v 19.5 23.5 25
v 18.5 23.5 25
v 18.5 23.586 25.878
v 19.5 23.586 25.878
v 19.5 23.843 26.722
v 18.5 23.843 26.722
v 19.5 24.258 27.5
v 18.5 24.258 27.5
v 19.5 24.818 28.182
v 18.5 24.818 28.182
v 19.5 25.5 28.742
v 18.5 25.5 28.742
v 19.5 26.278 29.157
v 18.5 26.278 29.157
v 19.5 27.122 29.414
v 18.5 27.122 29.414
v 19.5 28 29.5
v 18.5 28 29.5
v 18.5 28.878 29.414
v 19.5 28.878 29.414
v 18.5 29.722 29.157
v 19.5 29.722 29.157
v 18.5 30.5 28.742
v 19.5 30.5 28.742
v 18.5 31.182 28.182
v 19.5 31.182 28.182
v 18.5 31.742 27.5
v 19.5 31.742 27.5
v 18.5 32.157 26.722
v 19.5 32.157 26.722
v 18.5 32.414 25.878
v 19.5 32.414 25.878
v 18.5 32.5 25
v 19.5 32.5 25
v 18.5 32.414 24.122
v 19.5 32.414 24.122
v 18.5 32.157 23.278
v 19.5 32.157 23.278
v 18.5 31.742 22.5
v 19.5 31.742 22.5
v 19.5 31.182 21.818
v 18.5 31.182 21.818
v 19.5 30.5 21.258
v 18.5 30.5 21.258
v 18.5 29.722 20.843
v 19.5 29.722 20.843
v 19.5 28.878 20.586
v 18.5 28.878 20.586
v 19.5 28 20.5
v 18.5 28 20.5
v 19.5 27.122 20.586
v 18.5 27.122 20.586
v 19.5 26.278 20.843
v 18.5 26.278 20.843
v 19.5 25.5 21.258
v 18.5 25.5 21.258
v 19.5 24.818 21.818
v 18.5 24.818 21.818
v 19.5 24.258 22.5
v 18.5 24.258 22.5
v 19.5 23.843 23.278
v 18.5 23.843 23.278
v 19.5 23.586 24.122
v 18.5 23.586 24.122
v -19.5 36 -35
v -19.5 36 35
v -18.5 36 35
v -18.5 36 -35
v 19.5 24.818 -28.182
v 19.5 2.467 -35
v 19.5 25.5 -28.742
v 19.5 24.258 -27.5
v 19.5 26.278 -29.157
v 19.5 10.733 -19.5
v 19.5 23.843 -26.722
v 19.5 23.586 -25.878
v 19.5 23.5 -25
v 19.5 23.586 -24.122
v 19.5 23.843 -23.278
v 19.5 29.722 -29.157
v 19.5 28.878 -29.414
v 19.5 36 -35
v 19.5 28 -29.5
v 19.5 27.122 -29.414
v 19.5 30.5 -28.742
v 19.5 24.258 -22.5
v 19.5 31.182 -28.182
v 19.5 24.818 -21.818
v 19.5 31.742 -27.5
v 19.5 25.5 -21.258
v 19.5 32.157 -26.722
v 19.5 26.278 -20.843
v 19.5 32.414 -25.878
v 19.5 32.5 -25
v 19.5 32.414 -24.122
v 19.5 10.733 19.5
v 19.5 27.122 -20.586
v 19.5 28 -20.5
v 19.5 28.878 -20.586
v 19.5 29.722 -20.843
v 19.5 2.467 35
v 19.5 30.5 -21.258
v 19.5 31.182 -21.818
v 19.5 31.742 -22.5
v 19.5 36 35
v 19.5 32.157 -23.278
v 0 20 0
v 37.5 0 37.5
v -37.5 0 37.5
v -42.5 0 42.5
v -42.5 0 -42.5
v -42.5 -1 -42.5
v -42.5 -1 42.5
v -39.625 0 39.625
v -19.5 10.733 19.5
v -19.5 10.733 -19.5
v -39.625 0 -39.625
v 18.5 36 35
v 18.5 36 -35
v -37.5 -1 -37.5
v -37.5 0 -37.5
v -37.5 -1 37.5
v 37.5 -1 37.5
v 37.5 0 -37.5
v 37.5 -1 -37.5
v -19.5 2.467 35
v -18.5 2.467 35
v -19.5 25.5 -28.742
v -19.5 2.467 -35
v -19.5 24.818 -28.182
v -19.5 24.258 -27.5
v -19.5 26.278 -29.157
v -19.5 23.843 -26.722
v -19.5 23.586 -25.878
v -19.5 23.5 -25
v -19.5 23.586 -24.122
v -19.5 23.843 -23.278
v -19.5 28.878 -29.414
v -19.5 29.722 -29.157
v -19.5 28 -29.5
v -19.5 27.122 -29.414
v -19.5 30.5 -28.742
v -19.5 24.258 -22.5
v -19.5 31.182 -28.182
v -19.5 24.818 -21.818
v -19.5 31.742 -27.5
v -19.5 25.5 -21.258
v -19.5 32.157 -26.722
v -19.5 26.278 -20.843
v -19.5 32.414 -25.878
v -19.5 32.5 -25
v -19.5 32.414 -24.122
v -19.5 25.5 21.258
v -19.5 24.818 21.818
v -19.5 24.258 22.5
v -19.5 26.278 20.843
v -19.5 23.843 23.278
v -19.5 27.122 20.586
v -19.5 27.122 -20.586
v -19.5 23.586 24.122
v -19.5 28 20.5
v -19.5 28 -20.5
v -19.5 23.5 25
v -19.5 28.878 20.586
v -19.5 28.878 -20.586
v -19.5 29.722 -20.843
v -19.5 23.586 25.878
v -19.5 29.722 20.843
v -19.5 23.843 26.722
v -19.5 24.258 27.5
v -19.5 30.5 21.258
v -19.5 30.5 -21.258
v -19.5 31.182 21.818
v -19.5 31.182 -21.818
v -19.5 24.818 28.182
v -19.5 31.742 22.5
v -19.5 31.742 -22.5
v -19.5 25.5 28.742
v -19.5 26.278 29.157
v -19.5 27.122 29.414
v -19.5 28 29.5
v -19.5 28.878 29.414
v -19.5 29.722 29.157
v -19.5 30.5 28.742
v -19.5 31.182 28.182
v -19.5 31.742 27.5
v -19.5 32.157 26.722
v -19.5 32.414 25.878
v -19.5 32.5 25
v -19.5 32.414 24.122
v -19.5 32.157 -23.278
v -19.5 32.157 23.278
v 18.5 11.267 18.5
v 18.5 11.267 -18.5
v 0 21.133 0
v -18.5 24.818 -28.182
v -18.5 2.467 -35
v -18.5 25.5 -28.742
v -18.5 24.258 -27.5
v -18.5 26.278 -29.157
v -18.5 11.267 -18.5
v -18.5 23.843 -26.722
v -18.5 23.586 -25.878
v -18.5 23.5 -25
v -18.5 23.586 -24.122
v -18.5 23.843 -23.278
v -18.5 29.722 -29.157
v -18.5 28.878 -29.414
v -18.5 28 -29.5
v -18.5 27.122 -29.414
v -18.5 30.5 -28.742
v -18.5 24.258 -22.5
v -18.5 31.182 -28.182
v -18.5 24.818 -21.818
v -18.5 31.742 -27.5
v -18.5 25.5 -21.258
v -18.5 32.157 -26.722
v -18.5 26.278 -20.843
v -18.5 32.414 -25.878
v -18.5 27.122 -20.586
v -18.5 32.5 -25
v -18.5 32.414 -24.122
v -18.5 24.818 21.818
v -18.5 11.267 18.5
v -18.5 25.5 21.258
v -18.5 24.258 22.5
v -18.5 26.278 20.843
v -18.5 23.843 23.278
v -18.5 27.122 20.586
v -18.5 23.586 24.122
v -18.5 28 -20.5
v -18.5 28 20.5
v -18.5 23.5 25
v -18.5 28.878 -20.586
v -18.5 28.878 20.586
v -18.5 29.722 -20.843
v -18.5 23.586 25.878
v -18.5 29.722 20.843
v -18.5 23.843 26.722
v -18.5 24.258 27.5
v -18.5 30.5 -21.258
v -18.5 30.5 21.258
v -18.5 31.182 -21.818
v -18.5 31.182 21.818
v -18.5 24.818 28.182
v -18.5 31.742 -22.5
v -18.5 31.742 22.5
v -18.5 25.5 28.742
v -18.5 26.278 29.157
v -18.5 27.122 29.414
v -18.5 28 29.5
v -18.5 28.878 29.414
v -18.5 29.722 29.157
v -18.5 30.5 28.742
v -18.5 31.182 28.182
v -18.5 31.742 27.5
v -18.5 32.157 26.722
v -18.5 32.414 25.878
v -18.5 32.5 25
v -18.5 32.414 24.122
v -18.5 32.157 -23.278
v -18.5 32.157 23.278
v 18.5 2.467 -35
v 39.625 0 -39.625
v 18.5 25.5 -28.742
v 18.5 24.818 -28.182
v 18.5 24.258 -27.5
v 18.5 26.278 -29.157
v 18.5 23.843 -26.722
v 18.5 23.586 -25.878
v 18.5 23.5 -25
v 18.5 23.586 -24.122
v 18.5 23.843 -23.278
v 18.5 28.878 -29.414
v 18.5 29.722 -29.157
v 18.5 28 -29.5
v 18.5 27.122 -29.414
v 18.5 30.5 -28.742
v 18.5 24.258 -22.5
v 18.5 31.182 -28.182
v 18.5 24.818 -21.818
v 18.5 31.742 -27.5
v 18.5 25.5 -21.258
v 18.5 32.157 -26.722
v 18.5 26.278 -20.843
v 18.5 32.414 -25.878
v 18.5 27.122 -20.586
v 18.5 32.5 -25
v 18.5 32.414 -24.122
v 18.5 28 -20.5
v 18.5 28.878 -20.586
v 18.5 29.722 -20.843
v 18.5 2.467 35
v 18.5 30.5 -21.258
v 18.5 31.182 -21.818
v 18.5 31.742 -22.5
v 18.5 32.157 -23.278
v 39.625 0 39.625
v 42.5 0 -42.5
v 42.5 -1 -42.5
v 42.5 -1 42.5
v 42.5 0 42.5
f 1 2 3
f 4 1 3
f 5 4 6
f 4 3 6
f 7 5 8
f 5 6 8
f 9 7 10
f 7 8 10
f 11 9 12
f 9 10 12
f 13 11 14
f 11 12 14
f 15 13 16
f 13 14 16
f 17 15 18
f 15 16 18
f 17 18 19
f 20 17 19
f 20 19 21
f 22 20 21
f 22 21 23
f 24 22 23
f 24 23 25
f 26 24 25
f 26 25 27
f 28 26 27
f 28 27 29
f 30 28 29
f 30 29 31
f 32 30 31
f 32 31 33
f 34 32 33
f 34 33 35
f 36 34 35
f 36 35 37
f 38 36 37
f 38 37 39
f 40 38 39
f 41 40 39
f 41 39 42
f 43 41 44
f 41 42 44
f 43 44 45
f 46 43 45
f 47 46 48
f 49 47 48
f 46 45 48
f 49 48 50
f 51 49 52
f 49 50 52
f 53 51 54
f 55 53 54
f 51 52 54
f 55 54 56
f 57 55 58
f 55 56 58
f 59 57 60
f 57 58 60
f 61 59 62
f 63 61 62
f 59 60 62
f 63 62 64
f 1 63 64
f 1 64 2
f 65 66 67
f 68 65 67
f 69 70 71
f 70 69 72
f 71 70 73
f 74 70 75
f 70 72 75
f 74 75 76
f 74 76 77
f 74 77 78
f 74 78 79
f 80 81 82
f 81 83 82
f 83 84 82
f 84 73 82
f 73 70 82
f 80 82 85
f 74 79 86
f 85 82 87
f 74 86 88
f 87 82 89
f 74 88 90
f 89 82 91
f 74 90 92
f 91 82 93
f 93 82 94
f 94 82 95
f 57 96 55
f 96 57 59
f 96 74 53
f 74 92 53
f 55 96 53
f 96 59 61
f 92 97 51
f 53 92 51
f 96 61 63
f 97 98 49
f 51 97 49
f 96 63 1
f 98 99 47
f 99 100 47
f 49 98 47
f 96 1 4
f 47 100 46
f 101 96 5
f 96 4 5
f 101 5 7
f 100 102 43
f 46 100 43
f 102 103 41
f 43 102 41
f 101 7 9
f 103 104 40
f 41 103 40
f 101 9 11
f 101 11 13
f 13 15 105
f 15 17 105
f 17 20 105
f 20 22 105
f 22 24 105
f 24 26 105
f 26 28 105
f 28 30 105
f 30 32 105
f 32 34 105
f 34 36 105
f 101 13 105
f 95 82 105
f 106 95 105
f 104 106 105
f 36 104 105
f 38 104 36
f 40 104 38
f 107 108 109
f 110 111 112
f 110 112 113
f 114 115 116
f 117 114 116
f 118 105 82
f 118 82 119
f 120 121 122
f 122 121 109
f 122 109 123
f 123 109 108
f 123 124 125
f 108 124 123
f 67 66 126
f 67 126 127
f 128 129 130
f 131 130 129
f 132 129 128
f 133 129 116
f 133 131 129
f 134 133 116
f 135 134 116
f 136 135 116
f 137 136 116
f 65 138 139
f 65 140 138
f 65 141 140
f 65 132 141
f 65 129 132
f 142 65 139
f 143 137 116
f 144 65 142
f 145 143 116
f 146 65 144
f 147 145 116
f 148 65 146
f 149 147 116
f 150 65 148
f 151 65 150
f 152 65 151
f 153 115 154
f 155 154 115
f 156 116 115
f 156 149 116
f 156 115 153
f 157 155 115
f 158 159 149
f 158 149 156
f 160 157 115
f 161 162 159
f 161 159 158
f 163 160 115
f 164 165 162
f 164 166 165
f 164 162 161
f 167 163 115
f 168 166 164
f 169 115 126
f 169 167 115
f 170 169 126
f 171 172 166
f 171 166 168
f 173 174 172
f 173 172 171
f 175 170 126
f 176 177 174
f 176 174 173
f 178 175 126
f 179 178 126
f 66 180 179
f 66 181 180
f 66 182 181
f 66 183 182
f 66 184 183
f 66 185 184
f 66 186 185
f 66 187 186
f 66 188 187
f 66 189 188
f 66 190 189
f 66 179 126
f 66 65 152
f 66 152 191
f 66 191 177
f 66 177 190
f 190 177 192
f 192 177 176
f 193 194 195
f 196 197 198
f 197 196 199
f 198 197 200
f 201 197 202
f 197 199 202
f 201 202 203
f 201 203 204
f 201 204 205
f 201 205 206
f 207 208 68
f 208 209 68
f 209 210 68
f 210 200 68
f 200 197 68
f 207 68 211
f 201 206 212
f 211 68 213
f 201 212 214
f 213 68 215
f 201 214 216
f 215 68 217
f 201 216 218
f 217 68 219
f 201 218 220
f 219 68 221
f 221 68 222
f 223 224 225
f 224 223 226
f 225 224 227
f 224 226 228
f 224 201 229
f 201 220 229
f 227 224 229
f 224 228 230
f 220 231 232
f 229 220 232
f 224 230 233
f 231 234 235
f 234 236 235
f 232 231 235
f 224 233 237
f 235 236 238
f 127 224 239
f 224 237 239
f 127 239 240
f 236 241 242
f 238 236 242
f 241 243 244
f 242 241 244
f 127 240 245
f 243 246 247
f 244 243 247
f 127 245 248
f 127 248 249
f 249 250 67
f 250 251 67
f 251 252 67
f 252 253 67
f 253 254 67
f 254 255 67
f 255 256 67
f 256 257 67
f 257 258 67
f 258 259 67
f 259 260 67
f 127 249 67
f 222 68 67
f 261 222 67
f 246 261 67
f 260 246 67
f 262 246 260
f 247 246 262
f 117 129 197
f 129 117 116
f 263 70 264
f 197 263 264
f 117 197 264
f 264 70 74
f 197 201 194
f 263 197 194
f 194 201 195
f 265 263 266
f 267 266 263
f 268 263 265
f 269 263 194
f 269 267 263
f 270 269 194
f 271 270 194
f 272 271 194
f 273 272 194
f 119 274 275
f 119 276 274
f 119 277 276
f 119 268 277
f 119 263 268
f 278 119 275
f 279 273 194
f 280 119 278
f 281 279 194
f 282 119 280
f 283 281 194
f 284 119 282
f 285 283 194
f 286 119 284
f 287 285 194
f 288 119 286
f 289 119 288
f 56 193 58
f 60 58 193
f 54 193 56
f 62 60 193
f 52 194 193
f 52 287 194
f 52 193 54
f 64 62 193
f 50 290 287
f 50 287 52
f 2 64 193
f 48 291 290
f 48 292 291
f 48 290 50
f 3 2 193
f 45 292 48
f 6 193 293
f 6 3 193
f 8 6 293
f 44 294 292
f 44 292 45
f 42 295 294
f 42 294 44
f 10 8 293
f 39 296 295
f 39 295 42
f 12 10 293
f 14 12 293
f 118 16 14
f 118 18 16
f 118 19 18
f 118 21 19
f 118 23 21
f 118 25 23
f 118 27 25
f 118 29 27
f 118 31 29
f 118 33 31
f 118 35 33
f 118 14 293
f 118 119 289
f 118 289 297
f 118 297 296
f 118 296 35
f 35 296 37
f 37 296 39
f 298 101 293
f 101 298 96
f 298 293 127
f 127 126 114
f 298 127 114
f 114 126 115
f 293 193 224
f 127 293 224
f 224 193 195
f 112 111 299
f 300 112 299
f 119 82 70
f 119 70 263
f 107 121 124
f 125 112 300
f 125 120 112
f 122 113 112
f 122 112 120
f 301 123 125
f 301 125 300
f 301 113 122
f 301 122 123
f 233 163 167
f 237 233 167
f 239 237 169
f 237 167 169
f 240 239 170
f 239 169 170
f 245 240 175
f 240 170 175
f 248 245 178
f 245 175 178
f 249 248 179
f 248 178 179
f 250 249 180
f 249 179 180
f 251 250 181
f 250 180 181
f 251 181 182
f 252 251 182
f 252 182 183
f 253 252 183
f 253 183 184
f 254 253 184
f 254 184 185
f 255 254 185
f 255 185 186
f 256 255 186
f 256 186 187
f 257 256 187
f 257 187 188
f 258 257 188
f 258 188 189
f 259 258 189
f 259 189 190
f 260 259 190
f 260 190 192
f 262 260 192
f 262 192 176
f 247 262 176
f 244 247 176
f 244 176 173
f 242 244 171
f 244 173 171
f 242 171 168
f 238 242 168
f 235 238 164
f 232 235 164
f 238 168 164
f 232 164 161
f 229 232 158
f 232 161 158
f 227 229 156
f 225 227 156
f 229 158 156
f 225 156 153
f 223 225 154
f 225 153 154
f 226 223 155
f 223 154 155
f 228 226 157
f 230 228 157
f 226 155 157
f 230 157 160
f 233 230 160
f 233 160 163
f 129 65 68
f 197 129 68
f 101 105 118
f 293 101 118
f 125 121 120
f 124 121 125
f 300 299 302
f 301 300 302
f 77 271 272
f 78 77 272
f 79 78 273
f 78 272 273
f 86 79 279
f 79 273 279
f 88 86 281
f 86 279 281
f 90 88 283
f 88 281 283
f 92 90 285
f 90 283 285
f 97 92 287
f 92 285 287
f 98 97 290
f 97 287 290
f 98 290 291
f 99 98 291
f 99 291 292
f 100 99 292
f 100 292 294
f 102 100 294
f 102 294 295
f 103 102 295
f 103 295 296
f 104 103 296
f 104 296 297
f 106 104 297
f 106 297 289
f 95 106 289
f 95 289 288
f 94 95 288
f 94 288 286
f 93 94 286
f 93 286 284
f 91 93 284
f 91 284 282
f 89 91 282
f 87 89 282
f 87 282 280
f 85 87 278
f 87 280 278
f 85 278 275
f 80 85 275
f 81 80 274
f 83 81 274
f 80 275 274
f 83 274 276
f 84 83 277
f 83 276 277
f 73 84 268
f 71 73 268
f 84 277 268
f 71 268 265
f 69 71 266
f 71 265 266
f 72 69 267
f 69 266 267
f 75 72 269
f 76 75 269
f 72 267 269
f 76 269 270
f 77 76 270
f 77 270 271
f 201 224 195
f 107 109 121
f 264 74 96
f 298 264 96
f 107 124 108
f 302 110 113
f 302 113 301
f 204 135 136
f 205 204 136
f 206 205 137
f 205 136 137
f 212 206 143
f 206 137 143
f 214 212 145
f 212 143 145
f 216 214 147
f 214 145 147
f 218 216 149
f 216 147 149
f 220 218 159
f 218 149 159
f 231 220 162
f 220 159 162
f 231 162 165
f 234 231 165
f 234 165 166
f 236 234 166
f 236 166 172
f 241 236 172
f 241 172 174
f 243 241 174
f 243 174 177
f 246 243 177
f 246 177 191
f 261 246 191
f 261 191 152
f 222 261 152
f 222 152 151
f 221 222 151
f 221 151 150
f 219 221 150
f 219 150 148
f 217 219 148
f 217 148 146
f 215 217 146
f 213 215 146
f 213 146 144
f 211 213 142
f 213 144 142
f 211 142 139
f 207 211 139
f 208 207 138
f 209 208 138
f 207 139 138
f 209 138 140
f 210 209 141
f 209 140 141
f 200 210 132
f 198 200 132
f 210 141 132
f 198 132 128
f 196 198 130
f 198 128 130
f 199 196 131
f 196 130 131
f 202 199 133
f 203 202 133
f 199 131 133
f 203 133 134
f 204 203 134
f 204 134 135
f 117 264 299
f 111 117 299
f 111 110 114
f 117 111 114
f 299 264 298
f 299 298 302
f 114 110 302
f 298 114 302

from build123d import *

# Parameters (mm, degrees)
F0_W      = 75
F0_H      = 75
F4_T      = 1
F0_W_2    = 85
F0_H_2    = 85
F5_DEPTH  = 1
F7_W      = 1
F7_H      = 70
F9_R      = 4.5
F10_DEPTH = 62.001


# Not quite as in the source:
# - a pattern or mirror of a feature is missing from the dataset's text; its kind, count and spacing are read off the source's solid


with BuildPart() as f3:
    # F0 (on Front) → F3 section 0
    with BuildSketch(Plane.XZ, mode=Mode.PRIVATE) as f3_s0:
        Rectangle(F0_W, F0_H)
    loft([f3_s0.sketch, Vertex(0, 20, 0)])

    # F4
    f4_openings = [f3.faces().sort_by_distance(p)[0] for p in [
        (0, 0, 0),
    ]]
    offset(amount=F4_T, openings=f4_openings, kind=Kind.INTERSECTION)

    # F0 (on Front) → F5 (join)
    with BuildSketch(Plane.XZ):
        Rectangle(F0_W_2, F0_H_2)
        Rectangle(F0_W, F0_H, mode=Mode.SUBTRACT)
    extrude(amount=F5_DEPTH)

    # F7 (on offset) → F8 (join, up to the next surface of F3)
    with BuildSketch(Plane.XZ.offset(-36)):
        with Locations((-19, 0)):
            Rectangle(F7_W, F7_H)
    f8 = extrude(until=Until.NEXT)

    # F8_copies: F8 across plane
    add(f8.mirror(Plane(origin=(0, 0, 0), x_dir=(0, 0, 1), z_dir=(1, 0, 0))))

    # F9 (on face) → F10 (cut, through all)
    with BuildSketch(Plane(origin=(-19.5, 0, 0), x_dir=(0, -1, 0), z_dir=(-1, 0, 0))):
        with Locations((-28, -25)):
            Circle(F9_R)
        with Locations((-28, 25)):
            Circle(F9_R)
    extrude(amount=-F10_DEPTH, mode=Mode.SUBTRACT)


solid = f3.part
